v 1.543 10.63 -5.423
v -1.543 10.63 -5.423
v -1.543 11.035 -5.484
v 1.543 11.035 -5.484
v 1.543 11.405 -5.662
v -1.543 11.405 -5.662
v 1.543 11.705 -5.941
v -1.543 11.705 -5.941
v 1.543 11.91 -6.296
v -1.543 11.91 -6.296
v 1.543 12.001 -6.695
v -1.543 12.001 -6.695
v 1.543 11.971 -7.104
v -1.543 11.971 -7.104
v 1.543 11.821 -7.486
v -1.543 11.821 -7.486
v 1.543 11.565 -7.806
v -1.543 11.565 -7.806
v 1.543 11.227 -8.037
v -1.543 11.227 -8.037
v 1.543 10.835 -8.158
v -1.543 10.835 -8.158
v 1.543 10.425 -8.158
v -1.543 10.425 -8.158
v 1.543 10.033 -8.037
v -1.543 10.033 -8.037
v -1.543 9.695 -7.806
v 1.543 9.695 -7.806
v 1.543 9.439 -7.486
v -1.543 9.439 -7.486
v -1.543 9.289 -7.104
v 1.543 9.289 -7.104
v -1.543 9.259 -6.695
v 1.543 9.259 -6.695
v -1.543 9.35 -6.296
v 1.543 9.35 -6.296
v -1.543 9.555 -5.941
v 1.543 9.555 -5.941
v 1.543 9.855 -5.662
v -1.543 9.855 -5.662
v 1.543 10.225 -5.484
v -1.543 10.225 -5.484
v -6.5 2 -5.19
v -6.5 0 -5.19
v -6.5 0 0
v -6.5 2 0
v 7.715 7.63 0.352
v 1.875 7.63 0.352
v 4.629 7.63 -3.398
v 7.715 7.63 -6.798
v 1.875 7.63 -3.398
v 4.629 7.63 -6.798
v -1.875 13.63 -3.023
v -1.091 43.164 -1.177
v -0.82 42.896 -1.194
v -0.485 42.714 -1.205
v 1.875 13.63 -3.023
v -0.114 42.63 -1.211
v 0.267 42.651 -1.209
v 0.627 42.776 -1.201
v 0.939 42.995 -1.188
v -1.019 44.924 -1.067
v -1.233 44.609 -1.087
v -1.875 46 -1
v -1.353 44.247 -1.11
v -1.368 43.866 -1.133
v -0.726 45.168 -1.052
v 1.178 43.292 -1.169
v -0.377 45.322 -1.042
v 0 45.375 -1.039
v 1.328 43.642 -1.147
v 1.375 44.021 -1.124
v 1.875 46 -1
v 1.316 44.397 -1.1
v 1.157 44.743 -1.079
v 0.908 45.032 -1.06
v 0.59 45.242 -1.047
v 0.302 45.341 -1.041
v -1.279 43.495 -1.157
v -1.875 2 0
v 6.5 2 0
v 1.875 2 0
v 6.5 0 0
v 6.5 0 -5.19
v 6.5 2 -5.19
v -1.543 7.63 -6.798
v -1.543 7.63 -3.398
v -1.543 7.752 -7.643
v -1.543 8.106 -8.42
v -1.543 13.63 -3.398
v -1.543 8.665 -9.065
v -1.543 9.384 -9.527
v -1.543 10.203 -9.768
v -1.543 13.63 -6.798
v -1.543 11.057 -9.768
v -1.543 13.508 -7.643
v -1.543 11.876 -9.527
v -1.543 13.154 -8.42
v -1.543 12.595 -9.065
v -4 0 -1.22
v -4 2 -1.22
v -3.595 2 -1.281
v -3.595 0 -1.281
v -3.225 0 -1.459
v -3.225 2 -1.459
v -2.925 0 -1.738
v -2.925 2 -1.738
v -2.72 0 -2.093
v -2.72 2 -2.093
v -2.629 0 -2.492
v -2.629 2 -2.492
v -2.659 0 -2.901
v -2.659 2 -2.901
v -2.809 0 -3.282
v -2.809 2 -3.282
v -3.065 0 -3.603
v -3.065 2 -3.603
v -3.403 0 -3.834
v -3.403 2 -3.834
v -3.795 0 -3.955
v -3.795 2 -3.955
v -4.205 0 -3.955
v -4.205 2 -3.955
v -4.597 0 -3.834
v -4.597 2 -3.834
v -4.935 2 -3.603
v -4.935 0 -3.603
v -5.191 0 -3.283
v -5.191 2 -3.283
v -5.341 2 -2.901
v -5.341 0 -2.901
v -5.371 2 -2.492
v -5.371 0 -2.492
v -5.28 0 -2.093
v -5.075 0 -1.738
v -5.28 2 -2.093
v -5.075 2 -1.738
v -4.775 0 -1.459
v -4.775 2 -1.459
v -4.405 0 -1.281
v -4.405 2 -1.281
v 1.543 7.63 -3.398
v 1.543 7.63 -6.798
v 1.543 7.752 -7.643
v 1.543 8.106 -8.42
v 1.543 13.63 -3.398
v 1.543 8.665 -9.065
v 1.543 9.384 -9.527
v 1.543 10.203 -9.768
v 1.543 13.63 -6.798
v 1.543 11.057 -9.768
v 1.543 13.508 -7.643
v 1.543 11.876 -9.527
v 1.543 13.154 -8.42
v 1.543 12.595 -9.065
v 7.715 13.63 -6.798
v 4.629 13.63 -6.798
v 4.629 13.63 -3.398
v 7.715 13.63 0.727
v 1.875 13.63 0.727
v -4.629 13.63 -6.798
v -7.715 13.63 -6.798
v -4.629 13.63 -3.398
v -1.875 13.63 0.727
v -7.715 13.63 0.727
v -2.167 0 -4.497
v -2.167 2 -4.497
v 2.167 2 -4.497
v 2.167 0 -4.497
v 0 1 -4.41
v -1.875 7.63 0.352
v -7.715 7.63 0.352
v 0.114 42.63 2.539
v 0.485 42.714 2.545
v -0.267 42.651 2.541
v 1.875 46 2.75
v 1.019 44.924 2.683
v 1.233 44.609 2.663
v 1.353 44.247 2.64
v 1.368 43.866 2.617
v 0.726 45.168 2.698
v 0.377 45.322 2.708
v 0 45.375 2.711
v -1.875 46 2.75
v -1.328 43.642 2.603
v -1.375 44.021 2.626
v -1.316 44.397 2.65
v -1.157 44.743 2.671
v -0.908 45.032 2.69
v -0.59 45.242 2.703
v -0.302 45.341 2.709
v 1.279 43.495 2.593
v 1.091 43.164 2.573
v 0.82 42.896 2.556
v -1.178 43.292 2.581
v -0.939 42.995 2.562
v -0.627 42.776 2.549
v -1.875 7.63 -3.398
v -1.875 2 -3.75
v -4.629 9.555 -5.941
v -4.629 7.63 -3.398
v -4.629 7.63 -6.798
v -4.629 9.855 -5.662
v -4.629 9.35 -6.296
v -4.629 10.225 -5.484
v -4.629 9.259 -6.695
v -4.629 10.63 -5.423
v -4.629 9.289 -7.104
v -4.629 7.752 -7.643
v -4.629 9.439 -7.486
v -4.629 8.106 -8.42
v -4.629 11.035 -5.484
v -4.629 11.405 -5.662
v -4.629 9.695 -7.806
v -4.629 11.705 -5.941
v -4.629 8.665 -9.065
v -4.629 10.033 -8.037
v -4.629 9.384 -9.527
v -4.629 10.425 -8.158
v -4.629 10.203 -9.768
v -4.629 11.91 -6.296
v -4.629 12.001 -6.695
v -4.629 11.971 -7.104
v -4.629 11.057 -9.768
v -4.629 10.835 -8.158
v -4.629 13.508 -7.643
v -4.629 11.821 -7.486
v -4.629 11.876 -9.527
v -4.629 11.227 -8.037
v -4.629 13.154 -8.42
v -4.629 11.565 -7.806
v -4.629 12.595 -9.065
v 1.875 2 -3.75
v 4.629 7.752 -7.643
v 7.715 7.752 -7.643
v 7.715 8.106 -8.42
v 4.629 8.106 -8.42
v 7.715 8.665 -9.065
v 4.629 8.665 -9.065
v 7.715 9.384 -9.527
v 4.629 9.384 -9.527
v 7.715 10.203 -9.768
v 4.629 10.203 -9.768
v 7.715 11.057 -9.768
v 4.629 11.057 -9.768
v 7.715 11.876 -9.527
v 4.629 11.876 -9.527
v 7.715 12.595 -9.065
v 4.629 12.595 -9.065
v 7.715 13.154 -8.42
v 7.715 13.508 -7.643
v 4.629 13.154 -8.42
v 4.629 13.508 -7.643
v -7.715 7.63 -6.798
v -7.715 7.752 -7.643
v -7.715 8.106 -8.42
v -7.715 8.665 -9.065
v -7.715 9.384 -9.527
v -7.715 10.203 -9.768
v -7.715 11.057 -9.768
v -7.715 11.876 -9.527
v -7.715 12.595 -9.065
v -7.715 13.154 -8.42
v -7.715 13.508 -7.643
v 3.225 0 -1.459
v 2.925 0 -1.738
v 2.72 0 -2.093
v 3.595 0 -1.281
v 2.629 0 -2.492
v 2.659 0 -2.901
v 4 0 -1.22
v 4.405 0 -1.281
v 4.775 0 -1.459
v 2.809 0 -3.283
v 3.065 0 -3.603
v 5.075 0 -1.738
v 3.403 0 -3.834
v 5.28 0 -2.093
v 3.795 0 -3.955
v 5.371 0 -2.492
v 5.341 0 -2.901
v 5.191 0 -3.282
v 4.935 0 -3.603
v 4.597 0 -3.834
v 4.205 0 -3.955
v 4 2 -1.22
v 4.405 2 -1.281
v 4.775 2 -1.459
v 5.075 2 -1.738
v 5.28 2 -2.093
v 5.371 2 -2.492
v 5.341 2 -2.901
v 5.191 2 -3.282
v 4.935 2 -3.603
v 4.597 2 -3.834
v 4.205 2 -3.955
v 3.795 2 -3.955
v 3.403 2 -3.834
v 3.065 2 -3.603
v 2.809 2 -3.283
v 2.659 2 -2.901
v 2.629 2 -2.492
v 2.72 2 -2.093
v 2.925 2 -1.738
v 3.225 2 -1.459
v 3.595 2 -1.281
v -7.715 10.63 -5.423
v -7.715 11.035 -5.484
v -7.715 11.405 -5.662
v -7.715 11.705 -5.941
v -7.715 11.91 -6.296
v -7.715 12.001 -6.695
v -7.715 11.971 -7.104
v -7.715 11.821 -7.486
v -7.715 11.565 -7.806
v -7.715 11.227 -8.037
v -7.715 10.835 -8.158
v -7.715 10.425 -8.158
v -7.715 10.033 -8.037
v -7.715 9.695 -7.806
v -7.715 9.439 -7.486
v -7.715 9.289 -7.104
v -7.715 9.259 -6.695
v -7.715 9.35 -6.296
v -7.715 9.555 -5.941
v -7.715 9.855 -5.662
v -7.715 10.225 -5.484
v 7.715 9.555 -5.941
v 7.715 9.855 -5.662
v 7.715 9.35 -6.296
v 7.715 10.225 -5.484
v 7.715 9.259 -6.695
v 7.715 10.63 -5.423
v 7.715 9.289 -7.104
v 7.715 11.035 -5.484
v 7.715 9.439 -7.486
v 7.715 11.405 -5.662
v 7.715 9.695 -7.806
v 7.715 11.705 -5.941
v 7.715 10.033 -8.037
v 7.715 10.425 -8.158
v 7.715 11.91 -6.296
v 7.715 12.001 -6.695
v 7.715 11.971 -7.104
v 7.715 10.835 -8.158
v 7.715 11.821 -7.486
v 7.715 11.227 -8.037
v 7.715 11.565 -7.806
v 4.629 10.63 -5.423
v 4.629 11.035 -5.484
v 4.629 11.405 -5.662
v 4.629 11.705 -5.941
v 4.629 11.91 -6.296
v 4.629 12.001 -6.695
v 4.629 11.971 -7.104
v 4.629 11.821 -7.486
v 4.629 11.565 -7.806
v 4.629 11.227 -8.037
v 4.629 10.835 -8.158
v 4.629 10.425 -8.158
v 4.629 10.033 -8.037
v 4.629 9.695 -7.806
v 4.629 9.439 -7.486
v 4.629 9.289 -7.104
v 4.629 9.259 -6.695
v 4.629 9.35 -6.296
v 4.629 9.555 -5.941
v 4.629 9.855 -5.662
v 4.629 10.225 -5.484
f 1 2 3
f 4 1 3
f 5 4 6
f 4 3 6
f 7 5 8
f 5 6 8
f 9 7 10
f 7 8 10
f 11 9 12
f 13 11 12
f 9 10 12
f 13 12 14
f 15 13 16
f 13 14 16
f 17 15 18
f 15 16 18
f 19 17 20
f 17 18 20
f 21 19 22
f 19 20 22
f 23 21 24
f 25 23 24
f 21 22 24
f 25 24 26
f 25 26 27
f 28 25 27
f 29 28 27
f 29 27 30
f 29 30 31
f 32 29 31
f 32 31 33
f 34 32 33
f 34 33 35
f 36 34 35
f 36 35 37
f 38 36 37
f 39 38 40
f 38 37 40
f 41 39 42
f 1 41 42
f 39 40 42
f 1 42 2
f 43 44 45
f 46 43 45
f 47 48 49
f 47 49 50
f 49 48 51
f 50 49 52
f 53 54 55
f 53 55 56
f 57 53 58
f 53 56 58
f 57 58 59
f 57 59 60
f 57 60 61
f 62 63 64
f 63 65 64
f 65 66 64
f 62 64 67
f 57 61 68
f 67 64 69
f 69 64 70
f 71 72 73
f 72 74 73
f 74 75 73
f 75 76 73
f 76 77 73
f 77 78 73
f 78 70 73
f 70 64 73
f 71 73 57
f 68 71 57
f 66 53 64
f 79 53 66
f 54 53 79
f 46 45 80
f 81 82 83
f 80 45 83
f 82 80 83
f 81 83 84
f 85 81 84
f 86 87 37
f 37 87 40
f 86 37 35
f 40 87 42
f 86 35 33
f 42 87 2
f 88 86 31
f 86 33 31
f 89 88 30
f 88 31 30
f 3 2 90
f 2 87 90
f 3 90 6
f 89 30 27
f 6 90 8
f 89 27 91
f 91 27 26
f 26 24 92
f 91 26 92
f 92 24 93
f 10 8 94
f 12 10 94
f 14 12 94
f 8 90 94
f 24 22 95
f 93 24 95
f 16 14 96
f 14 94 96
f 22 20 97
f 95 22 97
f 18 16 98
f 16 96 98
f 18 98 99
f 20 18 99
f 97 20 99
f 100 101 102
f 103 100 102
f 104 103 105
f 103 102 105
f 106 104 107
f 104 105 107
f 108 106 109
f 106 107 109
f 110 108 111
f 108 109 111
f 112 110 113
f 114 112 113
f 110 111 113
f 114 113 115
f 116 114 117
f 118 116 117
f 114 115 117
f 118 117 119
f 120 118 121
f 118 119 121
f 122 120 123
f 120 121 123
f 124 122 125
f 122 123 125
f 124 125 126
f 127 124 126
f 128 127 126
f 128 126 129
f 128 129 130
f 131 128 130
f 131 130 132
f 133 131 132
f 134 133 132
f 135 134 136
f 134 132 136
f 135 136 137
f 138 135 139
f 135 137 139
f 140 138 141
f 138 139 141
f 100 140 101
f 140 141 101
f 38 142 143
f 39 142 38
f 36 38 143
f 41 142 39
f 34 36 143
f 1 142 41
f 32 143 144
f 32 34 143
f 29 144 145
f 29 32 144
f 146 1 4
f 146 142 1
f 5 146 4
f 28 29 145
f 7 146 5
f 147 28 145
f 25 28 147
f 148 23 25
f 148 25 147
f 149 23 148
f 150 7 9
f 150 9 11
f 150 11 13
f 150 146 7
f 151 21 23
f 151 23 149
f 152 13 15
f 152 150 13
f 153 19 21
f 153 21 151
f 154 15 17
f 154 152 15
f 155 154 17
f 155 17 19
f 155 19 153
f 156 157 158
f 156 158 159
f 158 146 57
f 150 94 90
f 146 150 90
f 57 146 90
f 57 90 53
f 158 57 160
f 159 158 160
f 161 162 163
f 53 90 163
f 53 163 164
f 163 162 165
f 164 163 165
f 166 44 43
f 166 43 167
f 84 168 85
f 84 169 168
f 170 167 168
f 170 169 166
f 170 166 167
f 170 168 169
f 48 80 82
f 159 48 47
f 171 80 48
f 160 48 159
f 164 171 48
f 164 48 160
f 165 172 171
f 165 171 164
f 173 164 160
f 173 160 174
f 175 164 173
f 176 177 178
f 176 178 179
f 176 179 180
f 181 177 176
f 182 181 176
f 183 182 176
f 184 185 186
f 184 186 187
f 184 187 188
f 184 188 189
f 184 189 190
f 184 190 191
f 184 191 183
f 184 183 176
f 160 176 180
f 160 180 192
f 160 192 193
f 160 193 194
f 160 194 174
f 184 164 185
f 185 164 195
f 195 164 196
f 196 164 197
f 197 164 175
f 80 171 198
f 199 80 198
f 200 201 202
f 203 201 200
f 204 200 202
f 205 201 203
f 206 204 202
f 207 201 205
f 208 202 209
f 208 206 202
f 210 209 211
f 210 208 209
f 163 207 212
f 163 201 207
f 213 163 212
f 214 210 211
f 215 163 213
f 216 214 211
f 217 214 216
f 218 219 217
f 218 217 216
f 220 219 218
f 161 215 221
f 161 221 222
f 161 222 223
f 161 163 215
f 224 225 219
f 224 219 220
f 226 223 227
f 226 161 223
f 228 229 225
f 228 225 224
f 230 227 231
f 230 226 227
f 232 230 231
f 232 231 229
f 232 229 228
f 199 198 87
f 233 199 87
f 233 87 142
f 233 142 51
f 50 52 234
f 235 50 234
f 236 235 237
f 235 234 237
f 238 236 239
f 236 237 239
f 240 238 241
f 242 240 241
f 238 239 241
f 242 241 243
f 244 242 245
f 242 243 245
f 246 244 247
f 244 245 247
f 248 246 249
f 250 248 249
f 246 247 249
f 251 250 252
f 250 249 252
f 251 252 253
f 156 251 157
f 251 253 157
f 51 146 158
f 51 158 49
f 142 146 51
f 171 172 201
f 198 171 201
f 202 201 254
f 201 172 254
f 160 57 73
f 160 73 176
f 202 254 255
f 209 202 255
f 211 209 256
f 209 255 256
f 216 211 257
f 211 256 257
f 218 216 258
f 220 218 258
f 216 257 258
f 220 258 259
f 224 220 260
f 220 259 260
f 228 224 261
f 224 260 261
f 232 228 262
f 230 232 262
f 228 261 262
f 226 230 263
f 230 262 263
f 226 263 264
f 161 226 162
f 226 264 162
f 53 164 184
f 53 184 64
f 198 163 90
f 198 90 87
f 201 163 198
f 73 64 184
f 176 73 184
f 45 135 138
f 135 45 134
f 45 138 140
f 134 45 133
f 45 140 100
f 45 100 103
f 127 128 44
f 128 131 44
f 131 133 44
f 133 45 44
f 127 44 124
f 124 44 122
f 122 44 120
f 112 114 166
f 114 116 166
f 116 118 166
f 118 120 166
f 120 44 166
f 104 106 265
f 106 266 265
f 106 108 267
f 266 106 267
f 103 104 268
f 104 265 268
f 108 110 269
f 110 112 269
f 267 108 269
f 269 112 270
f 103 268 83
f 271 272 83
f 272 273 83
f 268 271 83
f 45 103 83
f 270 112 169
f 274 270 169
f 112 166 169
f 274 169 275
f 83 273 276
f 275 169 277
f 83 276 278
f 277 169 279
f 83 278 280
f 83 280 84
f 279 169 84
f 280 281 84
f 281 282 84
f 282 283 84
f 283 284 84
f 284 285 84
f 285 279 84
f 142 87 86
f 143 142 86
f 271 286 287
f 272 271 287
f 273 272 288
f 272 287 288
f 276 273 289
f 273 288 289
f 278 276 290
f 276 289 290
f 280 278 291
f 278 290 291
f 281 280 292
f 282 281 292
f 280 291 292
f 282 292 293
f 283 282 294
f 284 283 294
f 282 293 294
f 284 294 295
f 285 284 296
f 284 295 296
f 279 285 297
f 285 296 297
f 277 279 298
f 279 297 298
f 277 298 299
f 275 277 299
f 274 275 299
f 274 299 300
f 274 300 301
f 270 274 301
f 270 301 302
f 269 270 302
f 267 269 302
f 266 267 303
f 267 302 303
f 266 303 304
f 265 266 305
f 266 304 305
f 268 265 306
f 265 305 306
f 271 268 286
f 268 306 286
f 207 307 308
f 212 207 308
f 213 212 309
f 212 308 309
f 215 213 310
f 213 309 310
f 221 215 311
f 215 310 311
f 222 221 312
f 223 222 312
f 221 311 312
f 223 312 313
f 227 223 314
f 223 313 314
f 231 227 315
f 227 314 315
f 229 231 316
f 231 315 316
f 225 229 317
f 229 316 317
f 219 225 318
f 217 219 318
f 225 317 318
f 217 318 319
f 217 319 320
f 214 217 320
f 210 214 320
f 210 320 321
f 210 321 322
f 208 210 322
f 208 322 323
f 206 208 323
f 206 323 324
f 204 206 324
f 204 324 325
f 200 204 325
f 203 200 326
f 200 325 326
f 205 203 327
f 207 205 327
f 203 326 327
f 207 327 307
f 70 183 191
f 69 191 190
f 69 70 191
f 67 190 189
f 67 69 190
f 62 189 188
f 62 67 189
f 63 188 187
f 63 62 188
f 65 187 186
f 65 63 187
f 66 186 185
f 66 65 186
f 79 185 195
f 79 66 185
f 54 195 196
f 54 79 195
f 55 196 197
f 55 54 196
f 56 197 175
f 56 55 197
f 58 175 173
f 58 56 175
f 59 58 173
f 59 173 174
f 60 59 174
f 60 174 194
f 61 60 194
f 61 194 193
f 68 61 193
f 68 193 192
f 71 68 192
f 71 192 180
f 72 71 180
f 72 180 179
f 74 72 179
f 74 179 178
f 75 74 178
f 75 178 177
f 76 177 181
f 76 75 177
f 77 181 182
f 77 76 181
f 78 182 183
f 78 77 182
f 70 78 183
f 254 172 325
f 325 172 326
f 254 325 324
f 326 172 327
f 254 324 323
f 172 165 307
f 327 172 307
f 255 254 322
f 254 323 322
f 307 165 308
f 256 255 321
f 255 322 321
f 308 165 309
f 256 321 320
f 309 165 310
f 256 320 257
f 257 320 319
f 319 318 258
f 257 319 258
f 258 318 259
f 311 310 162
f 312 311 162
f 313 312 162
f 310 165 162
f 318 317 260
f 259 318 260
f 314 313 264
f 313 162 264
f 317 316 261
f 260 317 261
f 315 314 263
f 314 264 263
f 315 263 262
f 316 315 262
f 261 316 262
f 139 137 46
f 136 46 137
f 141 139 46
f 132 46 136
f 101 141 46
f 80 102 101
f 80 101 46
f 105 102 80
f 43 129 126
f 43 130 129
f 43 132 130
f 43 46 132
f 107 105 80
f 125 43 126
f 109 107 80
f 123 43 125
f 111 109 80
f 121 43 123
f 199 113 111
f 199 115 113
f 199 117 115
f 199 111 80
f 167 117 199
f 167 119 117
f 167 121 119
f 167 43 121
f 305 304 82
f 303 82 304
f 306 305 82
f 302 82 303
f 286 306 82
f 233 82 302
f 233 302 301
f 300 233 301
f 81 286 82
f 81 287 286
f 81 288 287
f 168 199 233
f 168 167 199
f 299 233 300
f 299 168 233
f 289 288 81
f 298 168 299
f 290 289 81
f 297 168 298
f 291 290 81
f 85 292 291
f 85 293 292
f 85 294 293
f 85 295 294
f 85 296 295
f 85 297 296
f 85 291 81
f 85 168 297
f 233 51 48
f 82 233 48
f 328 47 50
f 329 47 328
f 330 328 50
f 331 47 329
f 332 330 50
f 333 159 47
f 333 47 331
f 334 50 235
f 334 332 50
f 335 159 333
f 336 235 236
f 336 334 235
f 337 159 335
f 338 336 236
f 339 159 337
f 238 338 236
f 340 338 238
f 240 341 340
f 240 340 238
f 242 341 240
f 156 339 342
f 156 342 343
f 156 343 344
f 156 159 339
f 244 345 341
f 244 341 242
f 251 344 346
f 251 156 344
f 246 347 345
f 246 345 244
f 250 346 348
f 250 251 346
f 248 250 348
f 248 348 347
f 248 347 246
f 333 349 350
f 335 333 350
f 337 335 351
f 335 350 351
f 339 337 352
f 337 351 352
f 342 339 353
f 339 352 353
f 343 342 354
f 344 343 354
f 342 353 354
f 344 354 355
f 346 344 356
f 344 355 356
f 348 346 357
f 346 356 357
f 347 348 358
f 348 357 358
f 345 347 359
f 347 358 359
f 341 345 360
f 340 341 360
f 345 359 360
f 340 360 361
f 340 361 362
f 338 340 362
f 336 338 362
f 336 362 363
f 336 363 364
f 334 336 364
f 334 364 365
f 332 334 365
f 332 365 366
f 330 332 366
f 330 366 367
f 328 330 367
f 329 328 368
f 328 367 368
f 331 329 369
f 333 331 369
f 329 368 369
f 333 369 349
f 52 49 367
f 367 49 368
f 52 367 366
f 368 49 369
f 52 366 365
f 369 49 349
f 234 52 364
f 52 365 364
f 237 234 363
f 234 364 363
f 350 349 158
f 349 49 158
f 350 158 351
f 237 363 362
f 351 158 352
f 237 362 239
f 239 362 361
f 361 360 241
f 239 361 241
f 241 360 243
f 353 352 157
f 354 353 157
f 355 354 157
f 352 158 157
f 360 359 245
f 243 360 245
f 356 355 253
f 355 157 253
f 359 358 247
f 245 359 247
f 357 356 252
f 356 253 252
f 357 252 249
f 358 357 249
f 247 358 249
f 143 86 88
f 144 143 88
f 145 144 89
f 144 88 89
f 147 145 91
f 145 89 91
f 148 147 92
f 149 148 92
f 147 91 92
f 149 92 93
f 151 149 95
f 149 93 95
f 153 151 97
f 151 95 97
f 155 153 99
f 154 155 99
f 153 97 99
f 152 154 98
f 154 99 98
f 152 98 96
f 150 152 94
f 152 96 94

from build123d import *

# Parameters (mm, degrees)
BOSS_EXTRUDE1_DEPTH     = 2
SKETCH2_R               = 1.375
CUT_EXTRUDE1_DEPTH      = 2
CUT_EXTRUDE3_DEPTH      = 47.745974282
CUT_EXTRUDE3_DEPTH_BACK = 47.745974282
SKETCH12_R              = 1.375
BOSS_EXTRUDE2_START     = -1.875
BOSS_EXTRUDE2_DEPTH     = 7.715
SKETCH16_R              = 1.375
BOSS_EXTRUDE3_DEPTH     = 3.086
LPATTERN1_COUNT         = 3
LPATTERN1_PITCH         = 6.172


with BuildPart() as part:
    # Sketch1 → Boss-Extrude1 (new body)
    with BuildSketch(Plane(origin=(0, 0, 0), x_dir=(1, 0, 0), z_dir=(0, 1, 0))):
        with BuildLine():
            Line((-6.5, 0), (6.5, 0))
            Line((6.5, 0), (6.5, 5.19))
            add(Edge.make_bspline(
                [(-6.5, 5.19), (0, 3.63), (6.5, 5.19)],
                knots=[0, 0, 0, 1, 1, 1], degree=2))
            Line((-6.5, 5.19), (-6.5, 0))
        make_face()
    extrude(amount=BOSS_EXTRUDE1_DEPTH)

    # Sketch2 → Cut-Extrude1 (cut)
    with BuildSketch(Plane(origin=(0, 2, 0), x_dir=(1, 0, 0), z_dir=(0, 1, 0))):
        with Locations(Location((-4, 2.595, 0), (0, 0, 270))):
            Circle(SKETCH2_R)
        with Locations(Location((4, 2.595, 0), (0, 0, 270))):
            Circle(SKETCH2_R)
    extrude(amount=-CUT_EXTRUDE1_DEPTH, mode=Mode.SUBTRACT)

    # Sketch4 → Loft2 section 0
    with BuildSketch(Plane(origin=(0, 2, 0), x_dir=(1, 0, 0), z_dir=(0, 1, 0))):
        with BuildLine():
            Line((-1.875, 3.75), (1.875, 3.75))
            Line((1.875, 3.75), (1.875, 0))
            Line((1.875, 0), (-1.875, 0))
            Line((-1.875, 0), (-1.875, 3.75))
        make_face()
    # Sketch6 → Loft2 section 1
    with BuildSketch(Plane(origin=(0, 46, 0), x_dir=(1, 0, 0), z_dir=(0, 1, 0))):
        with BuildLine():
            Line((-1.875, 1), (1.875, 1))
            Line((1.875, 1), (1.875, -2.75))
            Line((1.875, -2.75), (-1.875, -2.75))
            Line((-1.875, -2.75), (-1.875, 1))
        make_face()
    loft()

    # Sketch12 → Cut-Extrude3 (cut, two sides: drawn at the far end of the back side and taken through both)
    with BuildSketch(Plane.XY.offset(-CUT_EXTRUDE3_DEPTH_BACK)):
        with Locations(Location((0, 44, 0), (0, 0, 90))):
            Circle(SKETCH12_R)
    extrude(amount=CUT_EXTRUDE3_DEPTH + CUT_EXTRUDE3_DEPTH_BACK, mode=Mode.SUBTRACT)

    # Sketch13 → Boss-Extrude2 (add)
    with BuildSketch(Plane.ZY.offset(1.875).offset(BOSS_EXTRUDE2_START)):
        Polygon((-3.398125, 13.63), (-3.398125, 7.63), (0.351875, 7.63), (0.726875, 13.63), align=None)
    boss_extrude2 = extrude(amount=BOSS_EXTRUDE2_DEPTH)

    # Mirror1: Boss-Extrude2 across plane
    add(boss_extrude2.mirror(Plane(origin=(0, 0, 0), x_dir=(0, 0, 1), z_dir=(1, 0, 0))))

    # Sketch16 → Boss-Extrude3 (add)
    with BuildSketch(Plane.ZY.offset(7.715)):
        with BuildLine():
            Line((-3.398125, 7.63), (-6.798125, 7.63))
            ThreePointArc((-6.798125, 7.63), (-9.798125, 10.63), (-6.798125, 13.63))
            Line((-6.798125, 13.63), (-3.398125, 13.63))
            Line((-3.398125, 13.63), (-3.398125, 7.63))
        make_face()
        with Locations((-6.798125, 10.63)):
            Circle(SKETCH16_R, mode=Mode.SUBTRACT)
    boss_extrude3 = extrude(amount=-BOSS_EXTRUDE3_DEPTH)

    # LPattern1: Boss-Extrude3 ×3
    with Locations(*[(i * LPATTERN1_PITCH, 0, 0) for i in range(1, LPATTERN1_COUNT)]):
        add(boss_extrude3)


solid = part.part
